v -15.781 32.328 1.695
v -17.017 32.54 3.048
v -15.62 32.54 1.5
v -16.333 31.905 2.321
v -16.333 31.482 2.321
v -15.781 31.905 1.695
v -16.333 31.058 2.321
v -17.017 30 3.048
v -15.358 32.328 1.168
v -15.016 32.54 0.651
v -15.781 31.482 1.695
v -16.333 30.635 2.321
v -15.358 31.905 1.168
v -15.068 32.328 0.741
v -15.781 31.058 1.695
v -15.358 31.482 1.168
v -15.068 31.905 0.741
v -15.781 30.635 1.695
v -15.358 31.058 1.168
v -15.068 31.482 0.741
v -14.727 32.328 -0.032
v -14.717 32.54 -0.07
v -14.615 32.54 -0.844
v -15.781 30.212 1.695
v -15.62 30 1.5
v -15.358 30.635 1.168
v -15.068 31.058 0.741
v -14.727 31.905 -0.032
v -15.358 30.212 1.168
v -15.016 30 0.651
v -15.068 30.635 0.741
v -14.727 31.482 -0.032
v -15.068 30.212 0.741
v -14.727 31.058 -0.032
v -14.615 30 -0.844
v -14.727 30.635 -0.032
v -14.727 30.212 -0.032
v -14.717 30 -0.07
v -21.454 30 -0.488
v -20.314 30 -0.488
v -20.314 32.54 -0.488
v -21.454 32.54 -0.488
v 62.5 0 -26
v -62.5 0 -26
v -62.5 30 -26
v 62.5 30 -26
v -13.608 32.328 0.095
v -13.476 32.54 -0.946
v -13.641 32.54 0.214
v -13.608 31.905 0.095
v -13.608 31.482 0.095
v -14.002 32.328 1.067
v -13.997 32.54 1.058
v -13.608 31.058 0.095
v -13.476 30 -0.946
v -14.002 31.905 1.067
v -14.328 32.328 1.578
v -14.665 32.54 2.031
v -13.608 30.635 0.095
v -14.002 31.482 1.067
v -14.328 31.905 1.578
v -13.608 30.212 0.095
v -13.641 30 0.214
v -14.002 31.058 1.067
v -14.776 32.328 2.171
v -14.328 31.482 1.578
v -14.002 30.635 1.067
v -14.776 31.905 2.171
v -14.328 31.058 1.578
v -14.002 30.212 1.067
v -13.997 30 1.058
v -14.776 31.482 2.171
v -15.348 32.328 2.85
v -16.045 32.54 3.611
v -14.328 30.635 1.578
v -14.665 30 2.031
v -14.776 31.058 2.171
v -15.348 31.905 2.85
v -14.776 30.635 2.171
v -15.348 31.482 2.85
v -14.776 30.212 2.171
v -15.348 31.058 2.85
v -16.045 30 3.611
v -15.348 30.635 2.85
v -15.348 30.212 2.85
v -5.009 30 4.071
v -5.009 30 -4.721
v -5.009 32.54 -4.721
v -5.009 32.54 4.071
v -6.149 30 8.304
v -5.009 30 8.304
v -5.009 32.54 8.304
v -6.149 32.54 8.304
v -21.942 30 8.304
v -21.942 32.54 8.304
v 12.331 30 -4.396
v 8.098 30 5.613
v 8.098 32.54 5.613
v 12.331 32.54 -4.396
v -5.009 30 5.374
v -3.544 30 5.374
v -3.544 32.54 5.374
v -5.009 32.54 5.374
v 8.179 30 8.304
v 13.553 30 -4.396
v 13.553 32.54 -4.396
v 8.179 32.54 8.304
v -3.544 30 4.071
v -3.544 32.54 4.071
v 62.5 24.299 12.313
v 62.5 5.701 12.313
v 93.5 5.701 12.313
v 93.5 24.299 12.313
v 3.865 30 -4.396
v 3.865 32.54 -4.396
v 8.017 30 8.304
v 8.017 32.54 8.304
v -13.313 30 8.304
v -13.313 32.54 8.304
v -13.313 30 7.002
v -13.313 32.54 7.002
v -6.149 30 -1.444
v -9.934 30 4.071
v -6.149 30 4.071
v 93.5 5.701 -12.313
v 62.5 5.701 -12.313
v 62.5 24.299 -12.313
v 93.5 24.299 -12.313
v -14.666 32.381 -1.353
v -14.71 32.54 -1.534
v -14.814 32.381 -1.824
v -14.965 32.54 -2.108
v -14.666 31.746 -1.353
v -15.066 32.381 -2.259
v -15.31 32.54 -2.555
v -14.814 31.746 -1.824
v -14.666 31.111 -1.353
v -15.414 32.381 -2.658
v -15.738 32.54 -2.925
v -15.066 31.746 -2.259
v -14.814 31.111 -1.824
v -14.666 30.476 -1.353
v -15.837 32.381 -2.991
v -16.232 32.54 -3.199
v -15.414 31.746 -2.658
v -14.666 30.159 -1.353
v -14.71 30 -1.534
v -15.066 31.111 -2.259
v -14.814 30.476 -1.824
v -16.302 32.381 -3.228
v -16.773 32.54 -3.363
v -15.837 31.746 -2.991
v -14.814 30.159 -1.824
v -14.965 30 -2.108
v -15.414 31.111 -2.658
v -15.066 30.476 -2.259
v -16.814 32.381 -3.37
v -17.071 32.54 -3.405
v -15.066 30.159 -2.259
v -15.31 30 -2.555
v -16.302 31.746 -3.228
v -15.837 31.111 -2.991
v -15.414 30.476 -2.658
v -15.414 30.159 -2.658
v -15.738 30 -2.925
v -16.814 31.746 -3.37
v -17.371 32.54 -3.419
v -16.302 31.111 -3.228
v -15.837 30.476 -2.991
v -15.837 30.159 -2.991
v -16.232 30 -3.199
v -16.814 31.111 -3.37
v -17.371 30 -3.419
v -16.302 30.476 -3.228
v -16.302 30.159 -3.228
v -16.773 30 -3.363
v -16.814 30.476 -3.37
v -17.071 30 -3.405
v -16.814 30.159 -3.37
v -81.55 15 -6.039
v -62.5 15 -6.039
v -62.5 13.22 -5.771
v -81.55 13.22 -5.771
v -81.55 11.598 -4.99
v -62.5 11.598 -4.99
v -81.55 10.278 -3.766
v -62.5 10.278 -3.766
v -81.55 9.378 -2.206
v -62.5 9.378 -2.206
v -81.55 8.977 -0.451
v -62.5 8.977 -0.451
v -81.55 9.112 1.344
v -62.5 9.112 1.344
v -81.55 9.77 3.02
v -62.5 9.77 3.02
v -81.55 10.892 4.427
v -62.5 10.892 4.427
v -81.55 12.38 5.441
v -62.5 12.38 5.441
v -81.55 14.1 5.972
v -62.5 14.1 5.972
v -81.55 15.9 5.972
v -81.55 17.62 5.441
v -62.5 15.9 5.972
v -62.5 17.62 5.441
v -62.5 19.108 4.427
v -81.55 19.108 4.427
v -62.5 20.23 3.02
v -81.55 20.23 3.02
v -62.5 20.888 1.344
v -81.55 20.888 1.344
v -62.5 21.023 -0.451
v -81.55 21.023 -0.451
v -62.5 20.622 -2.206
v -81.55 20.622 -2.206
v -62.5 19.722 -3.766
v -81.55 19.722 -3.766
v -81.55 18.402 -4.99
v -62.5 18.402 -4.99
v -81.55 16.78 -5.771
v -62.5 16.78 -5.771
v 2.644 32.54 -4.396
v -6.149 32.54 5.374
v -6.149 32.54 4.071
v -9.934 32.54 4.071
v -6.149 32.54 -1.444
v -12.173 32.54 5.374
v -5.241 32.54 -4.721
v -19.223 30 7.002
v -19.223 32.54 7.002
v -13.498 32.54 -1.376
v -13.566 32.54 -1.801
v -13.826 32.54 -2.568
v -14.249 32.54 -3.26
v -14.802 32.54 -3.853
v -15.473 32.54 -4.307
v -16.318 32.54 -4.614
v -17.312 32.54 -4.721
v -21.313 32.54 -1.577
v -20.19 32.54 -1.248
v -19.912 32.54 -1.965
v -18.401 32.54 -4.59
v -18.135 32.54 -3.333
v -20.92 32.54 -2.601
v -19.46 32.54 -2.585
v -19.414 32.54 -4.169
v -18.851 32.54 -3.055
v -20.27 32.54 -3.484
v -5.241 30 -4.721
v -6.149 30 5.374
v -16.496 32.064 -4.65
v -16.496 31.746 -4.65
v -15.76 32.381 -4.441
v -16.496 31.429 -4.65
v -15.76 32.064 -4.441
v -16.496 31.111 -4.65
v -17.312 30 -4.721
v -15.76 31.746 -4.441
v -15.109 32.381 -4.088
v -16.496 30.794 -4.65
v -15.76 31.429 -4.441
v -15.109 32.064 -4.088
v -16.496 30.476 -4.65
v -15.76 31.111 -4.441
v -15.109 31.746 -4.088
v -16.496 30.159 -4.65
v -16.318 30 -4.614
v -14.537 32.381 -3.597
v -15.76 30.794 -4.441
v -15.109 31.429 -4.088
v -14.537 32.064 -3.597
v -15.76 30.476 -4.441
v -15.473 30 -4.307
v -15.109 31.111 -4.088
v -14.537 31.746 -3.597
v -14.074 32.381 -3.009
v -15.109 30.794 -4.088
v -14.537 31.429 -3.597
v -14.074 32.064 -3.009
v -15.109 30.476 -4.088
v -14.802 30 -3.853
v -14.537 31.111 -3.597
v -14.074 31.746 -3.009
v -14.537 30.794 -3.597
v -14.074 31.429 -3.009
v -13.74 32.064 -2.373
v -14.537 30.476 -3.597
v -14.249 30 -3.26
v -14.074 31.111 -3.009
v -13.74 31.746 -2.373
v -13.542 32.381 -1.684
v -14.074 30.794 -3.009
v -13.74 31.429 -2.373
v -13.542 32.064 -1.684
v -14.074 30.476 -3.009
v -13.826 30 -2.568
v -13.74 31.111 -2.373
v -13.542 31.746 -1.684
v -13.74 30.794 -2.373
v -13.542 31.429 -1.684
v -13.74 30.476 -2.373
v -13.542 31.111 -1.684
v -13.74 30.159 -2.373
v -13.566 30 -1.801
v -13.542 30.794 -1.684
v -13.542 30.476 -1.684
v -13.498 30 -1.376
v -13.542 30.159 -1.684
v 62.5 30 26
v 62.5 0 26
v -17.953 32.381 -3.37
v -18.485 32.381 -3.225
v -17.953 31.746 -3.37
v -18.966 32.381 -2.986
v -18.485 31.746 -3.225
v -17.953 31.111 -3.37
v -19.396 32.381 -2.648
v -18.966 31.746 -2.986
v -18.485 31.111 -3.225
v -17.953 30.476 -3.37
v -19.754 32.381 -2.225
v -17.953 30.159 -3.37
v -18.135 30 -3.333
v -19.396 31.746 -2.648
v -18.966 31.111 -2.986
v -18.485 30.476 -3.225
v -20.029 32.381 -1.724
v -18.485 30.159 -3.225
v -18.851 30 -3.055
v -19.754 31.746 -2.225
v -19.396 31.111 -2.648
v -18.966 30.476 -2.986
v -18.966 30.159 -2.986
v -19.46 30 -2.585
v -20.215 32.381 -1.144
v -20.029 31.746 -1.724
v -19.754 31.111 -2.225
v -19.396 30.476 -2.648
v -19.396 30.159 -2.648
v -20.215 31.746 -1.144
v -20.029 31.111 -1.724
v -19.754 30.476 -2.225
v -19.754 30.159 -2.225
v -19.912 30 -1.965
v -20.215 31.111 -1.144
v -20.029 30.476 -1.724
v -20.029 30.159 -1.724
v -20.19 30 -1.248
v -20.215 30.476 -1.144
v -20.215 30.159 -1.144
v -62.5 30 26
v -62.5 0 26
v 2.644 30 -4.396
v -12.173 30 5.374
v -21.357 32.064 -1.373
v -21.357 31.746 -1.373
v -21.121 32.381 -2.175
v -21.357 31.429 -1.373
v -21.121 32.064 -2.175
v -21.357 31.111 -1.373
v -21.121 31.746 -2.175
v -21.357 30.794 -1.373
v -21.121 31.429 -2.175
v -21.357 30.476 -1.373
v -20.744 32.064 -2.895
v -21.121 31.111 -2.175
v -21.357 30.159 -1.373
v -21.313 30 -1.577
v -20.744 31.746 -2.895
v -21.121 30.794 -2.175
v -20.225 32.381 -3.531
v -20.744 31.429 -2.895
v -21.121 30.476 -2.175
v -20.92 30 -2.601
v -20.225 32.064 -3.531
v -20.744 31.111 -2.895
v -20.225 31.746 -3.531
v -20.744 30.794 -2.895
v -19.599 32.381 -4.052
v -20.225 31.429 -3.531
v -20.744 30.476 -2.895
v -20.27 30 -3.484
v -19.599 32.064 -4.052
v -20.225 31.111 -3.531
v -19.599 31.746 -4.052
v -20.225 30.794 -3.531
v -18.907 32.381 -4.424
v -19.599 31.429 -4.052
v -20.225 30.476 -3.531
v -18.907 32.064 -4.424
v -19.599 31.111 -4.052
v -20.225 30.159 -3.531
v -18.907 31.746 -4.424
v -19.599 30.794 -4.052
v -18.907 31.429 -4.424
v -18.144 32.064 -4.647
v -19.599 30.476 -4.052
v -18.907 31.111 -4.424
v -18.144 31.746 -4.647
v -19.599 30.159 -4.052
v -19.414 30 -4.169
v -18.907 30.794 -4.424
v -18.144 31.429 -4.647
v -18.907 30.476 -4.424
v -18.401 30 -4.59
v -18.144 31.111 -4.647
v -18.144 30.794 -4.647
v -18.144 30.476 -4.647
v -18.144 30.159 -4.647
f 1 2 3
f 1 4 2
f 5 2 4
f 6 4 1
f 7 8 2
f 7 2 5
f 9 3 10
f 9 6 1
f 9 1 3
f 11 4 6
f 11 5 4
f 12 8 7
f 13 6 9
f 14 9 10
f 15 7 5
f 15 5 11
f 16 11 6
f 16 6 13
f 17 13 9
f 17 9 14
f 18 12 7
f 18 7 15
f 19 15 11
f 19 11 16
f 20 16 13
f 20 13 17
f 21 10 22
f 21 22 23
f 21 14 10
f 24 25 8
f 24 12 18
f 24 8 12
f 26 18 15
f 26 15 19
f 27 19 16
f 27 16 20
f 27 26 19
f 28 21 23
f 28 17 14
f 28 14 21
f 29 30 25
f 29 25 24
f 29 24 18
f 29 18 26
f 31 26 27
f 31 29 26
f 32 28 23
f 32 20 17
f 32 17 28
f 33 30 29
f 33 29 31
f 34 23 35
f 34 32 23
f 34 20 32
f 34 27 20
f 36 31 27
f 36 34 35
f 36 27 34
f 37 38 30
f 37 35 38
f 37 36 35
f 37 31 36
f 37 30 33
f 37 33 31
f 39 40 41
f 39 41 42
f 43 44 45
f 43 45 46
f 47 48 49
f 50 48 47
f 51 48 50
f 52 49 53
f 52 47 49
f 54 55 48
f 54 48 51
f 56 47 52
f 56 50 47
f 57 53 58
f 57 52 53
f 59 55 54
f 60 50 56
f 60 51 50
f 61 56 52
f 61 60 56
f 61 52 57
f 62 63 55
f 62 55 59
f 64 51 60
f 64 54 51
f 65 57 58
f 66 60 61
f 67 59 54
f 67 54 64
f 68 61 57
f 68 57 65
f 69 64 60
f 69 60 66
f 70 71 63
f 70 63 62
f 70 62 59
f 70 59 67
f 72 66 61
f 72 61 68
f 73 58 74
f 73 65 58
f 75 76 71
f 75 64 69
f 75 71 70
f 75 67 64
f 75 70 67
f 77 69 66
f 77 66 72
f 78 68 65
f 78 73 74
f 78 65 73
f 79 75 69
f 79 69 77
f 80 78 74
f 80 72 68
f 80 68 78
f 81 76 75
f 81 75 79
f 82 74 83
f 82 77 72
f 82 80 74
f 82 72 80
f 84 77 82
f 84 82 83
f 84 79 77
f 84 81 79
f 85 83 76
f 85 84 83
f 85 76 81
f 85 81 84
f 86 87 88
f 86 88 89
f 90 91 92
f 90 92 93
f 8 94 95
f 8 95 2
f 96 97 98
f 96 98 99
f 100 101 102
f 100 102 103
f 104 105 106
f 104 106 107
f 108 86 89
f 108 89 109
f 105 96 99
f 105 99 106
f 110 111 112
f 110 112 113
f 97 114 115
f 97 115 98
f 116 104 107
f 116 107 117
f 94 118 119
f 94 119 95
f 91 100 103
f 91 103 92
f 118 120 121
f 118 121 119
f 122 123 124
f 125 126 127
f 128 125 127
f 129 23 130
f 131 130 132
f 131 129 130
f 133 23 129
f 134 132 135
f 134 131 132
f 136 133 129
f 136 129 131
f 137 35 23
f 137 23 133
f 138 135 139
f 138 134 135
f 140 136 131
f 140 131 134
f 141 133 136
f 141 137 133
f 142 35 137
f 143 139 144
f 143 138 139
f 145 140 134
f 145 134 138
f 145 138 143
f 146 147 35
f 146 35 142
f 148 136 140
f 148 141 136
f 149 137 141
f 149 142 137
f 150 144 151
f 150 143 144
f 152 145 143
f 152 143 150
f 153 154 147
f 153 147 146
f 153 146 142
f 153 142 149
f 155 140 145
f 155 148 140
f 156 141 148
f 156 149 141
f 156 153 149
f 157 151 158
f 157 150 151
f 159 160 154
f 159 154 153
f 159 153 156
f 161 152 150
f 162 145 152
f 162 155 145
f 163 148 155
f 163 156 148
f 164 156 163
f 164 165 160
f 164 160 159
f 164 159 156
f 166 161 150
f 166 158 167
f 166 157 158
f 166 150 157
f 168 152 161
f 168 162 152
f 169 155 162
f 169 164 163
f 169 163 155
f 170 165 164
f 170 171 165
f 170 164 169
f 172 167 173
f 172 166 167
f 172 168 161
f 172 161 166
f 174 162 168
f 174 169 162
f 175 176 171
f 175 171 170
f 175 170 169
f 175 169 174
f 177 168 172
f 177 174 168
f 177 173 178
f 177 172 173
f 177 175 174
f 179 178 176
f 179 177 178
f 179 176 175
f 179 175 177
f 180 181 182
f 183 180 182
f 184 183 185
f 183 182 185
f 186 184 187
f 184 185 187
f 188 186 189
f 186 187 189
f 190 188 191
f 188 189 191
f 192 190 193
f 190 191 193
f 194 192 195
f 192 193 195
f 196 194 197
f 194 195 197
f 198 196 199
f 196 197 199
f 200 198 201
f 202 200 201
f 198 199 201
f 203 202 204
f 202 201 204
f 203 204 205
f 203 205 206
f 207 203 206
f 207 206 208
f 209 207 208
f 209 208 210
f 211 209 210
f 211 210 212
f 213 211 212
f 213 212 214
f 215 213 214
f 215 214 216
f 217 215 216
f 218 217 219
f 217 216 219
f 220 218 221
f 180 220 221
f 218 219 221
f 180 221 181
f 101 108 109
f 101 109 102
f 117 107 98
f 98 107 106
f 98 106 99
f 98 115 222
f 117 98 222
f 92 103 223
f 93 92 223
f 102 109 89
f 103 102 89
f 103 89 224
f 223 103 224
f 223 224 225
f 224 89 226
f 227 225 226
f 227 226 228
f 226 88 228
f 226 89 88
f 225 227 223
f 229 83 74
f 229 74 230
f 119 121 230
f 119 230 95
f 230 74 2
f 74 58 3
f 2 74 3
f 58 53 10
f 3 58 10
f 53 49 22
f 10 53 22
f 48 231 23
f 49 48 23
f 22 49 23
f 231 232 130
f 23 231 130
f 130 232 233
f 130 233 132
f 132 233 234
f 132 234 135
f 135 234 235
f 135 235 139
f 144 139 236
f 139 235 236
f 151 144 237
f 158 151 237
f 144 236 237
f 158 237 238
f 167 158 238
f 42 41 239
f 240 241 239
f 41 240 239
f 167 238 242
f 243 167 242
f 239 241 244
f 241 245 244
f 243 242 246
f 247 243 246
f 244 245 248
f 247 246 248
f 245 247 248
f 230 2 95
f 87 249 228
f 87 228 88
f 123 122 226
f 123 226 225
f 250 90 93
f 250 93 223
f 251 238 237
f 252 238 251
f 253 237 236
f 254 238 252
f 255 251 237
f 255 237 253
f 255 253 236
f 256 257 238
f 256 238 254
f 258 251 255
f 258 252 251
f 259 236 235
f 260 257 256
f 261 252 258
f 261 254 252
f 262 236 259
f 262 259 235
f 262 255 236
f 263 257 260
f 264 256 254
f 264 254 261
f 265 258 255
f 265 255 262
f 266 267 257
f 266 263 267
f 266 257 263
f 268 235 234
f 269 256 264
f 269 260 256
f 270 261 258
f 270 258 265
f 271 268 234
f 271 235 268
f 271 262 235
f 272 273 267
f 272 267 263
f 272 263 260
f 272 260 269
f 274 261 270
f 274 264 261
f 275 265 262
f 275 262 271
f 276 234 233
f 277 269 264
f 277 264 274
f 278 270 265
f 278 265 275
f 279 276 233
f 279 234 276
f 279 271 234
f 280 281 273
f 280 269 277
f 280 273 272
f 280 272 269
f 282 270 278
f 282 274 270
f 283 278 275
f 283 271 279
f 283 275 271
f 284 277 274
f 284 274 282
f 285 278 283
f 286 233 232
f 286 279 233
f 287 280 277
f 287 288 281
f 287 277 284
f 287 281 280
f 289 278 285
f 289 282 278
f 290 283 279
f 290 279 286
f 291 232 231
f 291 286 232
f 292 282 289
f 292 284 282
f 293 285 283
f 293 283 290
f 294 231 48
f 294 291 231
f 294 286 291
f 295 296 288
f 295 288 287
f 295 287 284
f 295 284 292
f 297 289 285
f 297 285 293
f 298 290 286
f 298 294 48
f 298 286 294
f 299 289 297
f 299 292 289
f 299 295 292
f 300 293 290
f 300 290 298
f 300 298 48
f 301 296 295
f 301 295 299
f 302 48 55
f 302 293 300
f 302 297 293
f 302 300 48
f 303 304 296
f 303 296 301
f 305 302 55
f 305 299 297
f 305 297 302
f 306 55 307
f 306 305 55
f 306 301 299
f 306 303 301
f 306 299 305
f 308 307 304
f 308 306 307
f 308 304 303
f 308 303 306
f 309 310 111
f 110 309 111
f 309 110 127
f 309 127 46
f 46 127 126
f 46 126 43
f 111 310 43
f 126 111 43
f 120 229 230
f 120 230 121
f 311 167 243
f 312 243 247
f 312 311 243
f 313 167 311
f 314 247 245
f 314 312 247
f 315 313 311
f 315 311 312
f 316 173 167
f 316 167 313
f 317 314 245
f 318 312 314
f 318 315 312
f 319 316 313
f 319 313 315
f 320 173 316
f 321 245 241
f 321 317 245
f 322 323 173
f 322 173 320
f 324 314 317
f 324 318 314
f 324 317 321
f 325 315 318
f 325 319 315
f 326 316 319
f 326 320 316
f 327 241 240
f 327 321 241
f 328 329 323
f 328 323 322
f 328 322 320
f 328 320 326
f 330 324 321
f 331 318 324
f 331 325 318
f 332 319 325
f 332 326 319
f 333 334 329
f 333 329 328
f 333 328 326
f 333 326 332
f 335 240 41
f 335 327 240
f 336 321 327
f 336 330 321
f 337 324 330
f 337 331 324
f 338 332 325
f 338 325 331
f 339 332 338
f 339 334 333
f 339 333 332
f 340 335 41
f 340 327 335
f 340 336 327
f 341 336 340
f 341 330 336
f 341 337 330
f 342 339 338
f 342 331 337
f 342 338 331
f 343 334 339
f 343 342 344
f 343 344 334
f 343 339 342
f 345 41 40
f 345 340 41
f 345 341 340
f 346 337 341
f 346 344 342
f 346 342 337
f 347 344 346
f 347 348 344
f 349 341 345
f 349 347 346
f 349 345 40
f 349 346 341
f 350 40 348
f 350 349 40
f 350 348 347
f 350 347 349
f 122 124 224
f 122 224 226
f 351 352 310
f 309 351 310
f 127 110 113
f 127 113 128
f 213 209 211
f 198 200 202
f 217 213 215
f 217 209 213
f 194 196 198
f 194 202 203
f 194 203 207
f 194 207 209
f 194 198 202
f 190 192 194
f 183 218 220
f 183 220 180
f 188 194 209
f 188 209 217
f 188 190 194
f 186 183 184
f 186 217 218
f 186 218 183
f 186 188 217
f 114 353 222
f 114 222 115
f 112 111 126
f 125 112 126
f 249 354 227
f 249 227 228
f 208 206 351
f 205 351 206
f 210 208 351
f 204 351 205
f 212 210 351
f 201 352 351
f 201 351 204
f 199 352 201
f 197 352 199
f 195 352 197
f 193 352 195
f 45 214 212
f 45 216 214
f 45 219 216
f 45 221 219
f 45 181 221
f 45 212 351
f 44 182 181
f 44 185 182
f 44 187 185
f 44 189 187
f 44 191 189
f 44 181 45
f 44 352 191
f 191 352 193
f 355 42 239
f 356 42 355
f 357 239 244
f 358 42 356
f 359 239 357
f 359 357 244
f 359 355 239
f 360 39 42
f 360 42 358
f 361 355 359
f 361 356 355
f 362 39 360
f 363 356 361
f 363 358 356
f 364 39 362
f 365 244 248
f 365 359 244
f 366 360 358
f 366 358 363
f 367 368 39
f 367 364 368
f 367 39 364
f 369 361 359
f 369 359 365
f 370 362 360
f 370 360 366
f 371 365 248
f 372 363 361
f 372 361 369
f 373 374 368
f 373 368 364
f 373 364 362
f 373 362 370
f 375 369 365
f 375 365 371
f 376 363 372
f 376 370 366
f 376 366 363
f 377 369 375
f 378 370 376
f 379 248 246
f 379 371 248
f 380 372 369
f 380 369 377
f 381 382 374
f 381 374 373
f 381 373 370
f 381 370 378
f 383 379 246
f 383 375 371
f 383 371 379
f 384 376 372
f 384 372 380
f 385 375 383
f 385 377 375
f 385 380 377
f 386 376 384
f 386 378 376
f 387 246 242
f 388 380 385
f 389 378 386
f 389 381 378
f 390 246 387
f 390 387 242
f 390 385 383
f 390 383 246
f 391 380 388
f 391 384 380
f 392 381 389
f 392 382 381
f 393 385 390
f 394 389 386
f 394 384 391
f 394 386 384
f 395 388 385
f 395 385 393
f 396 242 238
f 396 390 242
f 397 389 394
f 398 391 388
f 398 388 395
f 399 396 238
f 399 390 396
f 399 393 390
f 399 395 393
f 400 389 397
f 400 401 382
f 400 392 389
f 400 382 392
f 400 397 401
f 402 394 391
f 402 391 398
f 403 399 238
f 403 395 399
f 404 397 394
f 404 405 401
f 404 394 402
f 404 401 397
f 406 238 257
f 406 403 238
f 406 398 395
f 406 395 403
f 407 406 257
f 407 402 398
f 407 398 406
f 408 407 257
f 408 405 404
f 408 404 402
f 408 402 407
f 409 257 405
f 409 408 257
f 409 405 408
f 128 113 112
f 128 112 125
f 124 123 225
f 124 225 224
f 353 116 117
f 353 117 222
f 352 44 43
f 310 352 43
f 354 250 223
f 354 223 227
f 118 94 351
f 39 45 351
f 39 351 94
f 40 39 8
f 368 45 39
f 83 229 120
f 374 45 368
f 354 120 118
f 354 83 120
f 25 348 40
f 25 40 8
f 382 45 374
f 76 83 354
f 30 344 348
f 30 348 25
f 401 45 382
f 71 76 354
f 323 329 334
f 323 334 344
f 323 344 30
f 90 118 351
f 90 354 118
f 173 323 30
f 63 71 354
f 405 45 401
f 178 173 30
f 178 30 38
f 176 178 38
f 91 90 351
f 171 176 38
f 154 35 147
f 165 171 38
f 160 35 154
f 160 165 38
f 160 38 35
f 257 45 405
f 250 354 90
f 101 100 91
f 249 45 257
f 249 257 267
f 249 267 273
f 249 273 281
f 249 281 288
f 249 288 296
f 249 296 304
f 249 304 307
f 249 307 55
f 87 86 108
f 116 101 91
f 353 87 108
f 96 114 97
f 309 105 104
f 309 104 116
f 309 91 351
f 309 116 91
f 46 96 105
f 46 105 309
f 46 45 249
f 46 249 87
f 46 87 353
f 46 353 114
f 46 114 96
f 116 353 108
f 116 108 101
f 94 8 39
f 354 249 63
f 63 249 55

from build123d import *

# Parameters (mm, degrees)
SKETCH1_W           = 125
SKETCH1_H           = 52
BOSS_EXTRUDE1_DEPTH = 30
SKETCH2_W           = 24.62687601
SKETCH2_H           = 18.598470566
BOSS_EXTRUDE2_DEPTH = 31
SKETCH3_R           = 6.039414619
BOSS_EXTRUDE3_DEPTH = 19.05
BOSS_EXTRUDE4_DEPTH = 2.54


with BuildPart() as part:
    # Sketch1 → Boss-Extrude1 (new body)
    with BuildSketch(Plane(origin=(0, 0, 0), x_dir=(1, 0, 0), z_dir=(0, 1, 0))):
        Rectangle(SKETCH1_W, SKETCH1_H)
    extrude(amount=BOSS_EXTRUDE1_DEPTH)

    # Sketch2 → Boss-Extrude2 (add)
    with BuildSketch(Plane(origin=(62.5, 0, 0), x_dir=(0, 0, -1), z_dir=(1, 0, 0))):
        with Locations((0, 15)):
            Rectangle(SKETCH2_W, SKETCH2_H)
    extrude(amount=BOSS_EXTRUDE2_DEPTH)

    # Sketch3 → Boss-Extrude3 (add)
    with BuildSketch(Plane.ZY.offset(62.5)):
        with Locations(Location((0, 15, 0), (0, 0, 180))):
            Circle(SKETCH3_R)
    extrude(amount=BOSS_EXTRUDE3_DEPTH)

    # Sketch4 → Boss-Extrude4 (add)
    # profile 1 of 3: a face of its own
    with BuildSketch(Plane(origin=(0, 30, 0), x_dir=(1, 0, 0), z_dir=(0, 1, 0))):
        with BuildLine():
            Line((-20.314153968, 0.487864775), (-21.453897558, 0.487864775))
            add(Edge.make_bspline(
                [(-21.453897558, 0.487864775), (-21.446469317, 0.639070568), (-21.431880449, 0.936034721), (-21.363560657, 1.369010039), (-21.26580376, 1.782866023), (-21.127586198, 2.17427971), (-20.95593199, 2.546711954), (-20.750083034, 2.898683439), (-20.506265347, 3.228851467), (-20.22974377, 3.53415527), (-19.929411851, 3.814235884), (-19.60535887, 4.056099193), (-19.264835486, 4.260451887), (-18.908874809, 4.431289536), (-18.533460764, 4.559522691), (-18.142000109, 4.654669783), (-17.732772957, 4.71191538), (-17.453953448, 4.71806866), (-17.312150763, 4.721198109)],
                knots=[0, 0, 0, 0, 1.10065271, 2.161652631, 3.183658789, 4.190468796, 5.17591951, 6.163126047, 7.15150782, 8.156236427, 9.156009102, 10.134482811, 11.092018607, 12.041330605, 13.001268258, 13.972401359, 14.968799086, 16, 16, 16, 16], degree=3))
            add(Edge.make_bspline(
                [(-17.312150763, 4.721198109), (-17.17289318, 4.717937995), (-16.899257003, 4.711531989), (-16.499889122, 4.656519111), (-16.119697225, 4.570356536), (-15.759424473, 4.449469168), (-15.421945324, 4.286965675), (-15.104724562, 4.091757463), (-14.80398562, 3.865988361), (-14.533269577, 3.600181666), (-14.284683118, 3.316418728), (-14.070226364, 3.013476906), (-13.886572885, 2.700587784), (-13.733491875, 2.375365452), (-13.620802456, 2.034747721), (-13.535247244, 1.683693585), (-13.486887772, 1.318569271), (-13.479465807, 1.071439769), (-13.47569243, 0.945797468)],
                knots=[0, 0, 0, 0, 1.111607364, 2.184268762, 3.212621178, 4.221274766, 5.211760367, 6.196651075, 7.1921475, 8.207485113, 9.220403448, 10.201281604, 11.166441695, 12.114753415, 13.065576456, 14.026450734, 14.996634279, 16, 16, 16, 16], degree=3))
            add(Edge.make_bspline(
                [(-13.47569243, 0.945797468), (-13.481836555, 0.768912468), (-13.494016985, 0.41824655), (-13.598209151, -0.097064524), (-13.76093792, -0.596332073), (-13.956871186, -0.998150283), (-14.15452834, -1.321940389), (-14.332645868, -1.588526833), (-14.541161039, -1.875566675), (-14.783108732, -2.182098728), (-15.053484011, -2.510524012), (-15.354735861, -2.860644127), (-15.689012495, -3.228841692), (-15.923630484, -3.480322017), (-16.045203648, -3.610632821)],
                knots=[0, 0, 0, 0, 1.184426356, 2.348067706, 3.509069118, 4.696110526, 5.333549288, 6.050745305, 6.844228056, 7.710549037, 8.667450064, 9.695053472, 10.805634456, 12, 12, 12, 12], degree=3))
            Line((-16.045203648, -3.610632821), (-19.222747718, -7.001878814))
            Line((-19.222747718, -7.001878814), (-13.312871917, -7.001878814))
            Line((-13.312871917, -7.001878814), (-13.312871917, -8.304442917))
            Line((-13.312871917, -8.304442917), (-21.942359096, -8.304442917))
            Line((-21.942359096, -8.304442917), (-17.017038583, -3.048393237))
            add(Edge.make_bspline(
                [(-17.017038583, -3.048393237), (-16.897121966, -2.923213668), (-16.666786684, -2.682769334), (-16.341004191, -2.331730593), (-16.048399862, -2.006067973), (-15.787079609, -1.706396783), (-15.562712318, -1.428333666), (-15.363604505, -1.180884313), (-15.204072217, -0.953175307), (-15.030933496, -0.689230794), (-14.863242763, -0.366968957), (-14.719143643, 0.026853286), (-14.631278336, 0.432263603), (-14.620737932, 0.706228138), (-14.615436019, 0.844034647)],
                knots=[0, 0, 0, 0, 1.329631726, 2.553950428, 3.673215718, 4.687767853, 5.603093632, 6.413772471, 7.123043292, 7.734684054, 8.834405432, 9.900288307, 10.943827018, 12, 12, 12, 12], degree=3))
            add(Edge.make_bspline(
                [(-14.615436019, 0.844034647), (-14.617742856, 0.930690007), (-14.622289187, 1.101471081), (-14.662412832, 1.351863407), (-14.723048097, 1.593398589), (-14.809935176, 1.826819578), (-14.92462249, 2.049779515), (-15.064225898, 2.262549801), (-15.225298413, 2.46824976), (-15.411630162, 2.661120299), (-15.616323391, 2.83776353), (-15.832565383, 2.994242354), (-16.061347189, 3.125012842), (-16.301704204, 3.232213532), (-16.552966336, 3.316307058), (-16.815619554, 3.37457676), (-17.088938127, 3.411161774), (-17.27556824, 3.416111769), (-17.370664385, 3.418634006)],
                knots=[0, 0, 0, 0, 0.991446411, 1.95395049, 2.89581595, 3.838931463, 4.798493298, 5.75982156, 6.748411868, 7.785213223, 8.824556874, 9.840280684, 10.836137867, 11.835679398, 12.848801643, 13.863922112, 14.911575587, 16, 16, 16, 16], degree=3))
            add(Edge.make_bspline(
                [(-17.370664385, 3.418634006), (-17.469981406, 3.416039461), (-17.665023638, 3.410944201), (-17.951386986, 3.375301963), (-18.224566808, 3.313812771), (-18.485250284, 3.229714553), (-18.733878496, 3.122822104), (-18.969242313, 2.989683488), (-19.190813368, 2.830811955), (-19.399008181, 2.650687651), (-19.590828905, 2.450145212), (-19.759364712, 2.226589061), (-19.906626706, 1.984101011), (-20.035111639, 1.723335356), (-20.139453714, 1.441925925), (-20.21918486, 1.140871682), (-20.282274275, 0.821479812), (-20.303350907, 0.60091679), (-20.314153968, 0.487864775)],
                knots=[0, 0, 0, 0, 1.031018746, 2.02475058, 2.990194455, 3.934040569, 4.864654155, 5.795059489, 6.735614925, 7.690564532, 8.649604399, 9.611025574, 10.590972636, 11.591080095, 12.624614302, 13.701020113, 14.821632451, 16, 16, 16, 16], degree=3))
        make_face()
    # profile 2 of 3: a face of its own
    with BuildSketch(Plane(origin=(0, 30, 0), x_dir=(1, 0, 0), z_dir=(0, 1, 0))):
        Polygon((-5.24053618, 4.721198109), (-5.009025763, 4.721198109), (-5.009025763, -4.071109584), (-3.543641148, -4.071109584), (-3.543641148, -5.373673686), (-5.009025763, -5.373673686), (-5.009025763, -8.304442917), (-6.148769353, -8.304442917), (-6.148769353, -5.373673686), (-12.173128327, -5.373673686), align=None)
        Polygon((-6.148769353, -4.071109584), (-6.148769353, 1.444435288), (-9.934346276, -4.071109584), align=None, mode=Mode.SUBTRACT)
    # profile 3 of 3: a face of its own
    with BuildSketch(Plane(origin=(0, 30, 0), x_dir=(1, 0, 0), z_dir=(0, 1, 0))):
        Polygon((2.64353834, 4.395557083), (3.864692186, 4.395557083), (8.098025519, -5.612816314), (12.331358852, 4.395557083), (13.552512699, 4.395557083), (8.179435776, -8.304442917), (8.016615263, -8.304442917), align=None)
    extrude(amount=BOSS_EXTRUDE4_DEPTH)


solid = part.part
